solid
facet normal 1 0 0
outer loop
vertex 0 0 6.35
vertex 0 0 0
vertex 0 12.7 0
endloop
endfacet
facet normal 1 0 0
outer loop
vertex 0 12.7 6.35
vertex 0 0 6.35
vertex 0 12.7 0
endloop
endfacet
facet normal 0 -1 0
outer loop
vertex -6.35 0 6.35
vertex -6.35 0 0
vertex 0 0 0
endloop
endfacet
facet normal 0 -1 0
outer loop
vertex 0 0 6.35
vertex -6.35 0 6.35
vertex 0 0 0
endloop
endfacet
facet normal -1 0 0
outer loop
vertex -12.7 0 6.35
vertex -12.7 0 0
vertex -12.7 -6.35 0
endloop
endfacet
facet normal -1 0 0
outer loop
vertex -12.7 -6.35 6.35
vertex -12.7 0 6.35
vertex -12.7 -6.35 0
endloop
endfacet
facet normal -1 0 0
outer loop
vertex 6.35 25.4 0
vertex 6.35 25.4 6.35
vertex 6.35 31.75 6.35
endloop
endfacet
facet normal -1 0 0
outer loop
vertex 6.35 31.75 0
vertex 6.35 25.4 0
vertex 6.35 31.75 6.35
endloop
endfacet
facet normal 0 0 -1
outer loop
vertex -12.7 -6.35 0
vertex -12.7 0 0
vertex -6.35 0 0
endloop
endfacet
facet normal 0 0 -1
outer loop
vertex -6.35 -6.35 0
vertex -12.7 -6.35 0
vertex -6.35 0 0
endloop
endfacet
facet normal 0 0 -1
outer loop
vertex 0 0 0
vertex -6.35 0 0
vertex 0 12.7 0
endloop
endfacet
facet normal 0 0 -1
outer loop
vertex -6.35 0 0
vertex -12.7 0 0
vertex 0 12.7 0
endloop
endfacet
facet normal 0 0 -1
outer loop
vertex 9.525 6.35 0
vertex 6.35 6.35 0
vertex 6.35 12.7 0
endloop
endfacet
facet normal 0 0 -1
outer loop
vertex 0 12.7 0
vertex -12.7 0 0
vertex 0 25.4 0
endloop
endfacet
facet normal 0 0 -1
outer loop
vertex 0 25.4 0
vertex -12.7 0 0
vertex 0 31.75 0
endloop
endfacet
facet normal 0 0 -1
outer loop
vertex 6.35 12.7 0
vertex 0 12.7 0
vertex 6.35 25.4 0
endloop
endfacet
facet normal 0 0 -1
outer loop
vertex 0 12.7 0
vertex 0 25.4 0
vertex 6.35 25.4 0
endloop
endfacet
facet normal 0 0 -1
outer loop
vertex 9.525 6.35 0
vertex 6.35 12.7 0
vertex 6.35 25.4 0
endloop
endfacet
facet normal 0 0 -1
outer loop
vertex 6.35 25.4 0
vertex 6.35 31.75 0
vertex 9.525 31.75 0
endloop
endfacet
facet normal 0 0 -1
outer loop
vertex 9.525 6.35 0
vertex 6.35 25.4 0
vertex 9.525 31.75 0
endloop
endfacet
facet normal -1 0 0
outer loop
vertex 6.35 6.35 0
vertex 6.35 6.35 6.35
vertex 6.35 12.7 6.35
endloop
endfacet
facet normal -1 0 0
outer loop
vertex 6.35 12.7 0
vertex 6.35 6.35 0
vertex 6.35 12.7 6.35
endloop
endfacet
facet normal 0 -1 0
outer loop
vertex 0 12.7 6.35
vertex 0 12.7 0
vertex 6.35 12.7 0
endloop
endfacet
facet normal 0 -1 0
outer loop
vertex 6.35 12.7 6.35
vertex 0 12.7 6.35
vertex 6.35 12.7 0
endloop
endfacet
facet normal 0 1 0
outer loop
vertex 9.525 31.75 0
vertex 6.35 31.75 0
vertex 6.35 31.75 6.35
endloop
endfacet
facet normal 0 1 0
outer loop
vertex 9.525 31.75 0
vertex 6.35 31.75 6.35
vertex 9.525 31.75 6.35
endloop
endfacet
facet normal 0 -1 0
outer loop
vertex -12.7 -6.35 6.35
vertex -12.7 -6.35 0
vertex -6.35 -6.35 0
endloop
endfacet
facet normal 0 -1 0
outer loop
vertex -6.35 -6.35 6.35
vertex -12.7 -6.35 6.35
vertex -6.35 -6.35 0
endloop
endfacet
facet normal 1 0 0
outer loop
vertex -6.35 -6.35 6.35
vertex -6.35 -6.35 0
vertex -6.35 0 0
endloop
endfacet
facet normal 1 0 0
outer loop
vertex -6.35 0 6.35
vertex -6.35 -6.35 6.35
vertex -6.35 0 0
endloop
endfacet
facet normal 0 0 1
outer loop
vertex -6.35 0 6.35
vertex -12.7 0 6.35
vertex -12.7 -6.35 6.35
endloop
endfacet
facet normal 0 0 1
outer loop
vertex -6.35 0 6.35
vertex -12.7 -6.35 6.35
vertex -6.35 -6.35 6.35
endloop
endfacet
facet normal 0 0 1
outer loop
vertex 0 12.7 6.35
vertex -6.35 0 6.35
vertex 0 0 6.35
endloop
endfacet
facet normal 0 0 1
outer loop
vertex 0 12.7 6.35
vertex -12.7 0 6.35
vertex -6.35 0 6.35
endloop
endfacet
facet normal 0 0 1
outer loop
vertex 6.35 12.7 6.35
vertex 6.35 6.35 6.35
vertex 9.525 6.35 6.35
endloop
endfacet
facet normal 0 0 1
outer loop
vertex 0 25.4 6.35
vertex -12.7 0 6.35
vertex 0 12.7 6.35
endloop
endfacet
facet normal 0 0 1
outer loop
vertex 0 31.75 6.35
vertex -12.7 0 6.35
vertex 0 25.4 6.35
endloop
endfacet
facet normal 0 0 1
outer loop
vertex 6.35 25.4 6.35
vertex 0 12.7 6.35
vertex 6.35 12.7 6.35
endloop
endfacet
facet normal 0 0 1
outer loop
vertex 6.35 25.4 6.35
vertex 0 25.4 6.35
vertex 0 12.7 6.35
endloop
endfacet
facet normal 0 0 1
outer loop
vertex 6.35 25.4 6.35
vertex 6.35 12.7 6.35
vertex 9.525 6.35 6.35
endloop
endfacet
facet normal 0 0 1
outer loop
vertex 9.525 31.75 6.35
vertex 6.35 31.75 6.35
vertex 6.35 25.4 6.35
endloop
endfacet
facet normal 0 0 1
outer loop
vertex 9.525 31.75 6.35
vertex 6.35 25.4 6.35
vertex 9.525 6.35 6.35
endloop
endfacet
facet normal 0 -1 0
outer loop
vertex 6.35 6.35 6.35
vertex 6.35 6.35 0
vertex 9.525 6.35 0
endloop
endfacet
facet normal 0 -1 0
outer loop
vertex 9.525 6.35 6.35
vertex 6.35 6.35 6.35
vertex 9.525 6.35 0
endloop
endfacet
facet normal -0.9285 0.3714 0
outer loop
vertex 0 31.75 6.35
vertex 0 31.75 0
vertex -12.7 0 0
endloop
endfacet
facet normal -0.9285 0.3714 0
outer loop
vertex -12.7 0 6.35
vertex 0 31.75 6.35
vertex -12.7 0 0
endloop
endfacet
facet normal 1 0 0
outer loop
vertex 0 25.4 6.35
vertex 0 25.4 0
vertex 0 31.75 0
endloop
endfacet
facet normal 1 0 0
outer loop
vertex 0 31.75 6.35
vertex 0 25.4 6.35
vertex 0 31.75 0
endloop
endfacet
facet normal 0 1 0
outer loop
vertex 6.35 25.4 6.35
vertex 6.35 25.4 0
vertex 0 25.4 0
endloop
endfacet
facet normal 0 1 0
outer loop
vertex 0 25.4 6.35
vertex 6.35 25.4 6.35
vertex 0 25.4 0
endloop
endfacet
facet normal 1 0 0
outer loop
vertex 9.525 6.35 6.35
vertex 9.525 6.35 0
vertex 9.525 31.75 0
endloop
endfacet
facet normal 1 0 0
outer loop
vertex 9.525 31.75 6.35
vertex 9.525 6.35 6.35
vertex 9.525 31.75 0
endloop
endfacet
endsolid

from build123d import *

# Parameters (mm, degrees)
BOSS_EXTRUDE1_DEPTH = 6.35
SKETCH2_W           = 3.175
SKETCH2_H           = 25.4
BOSS_EXTRUDE2_DEPTH = 6.35


with BuildPart() as part:
    # Sketch1 → Boss-Extrude1 (new body)
    with BuildSketch(Plane.XY):
        Polygon((0, 0), (0, 12.7), (6.35, 12.7), (6.35, 25.4), (0, 25.4), (0, 31.75), (-12.7, 0), (-12.7, -6.35), (-6.35, -6.35), (-6.35, 0), align=None)
    extrude(amount=BOSS_EXTRUDE1_DEPTH)

    # Sketch2 → Boss-Extrude2 (add)
    with BuildSketch(Plane.XY):
        with Locations((7.9375, 19.05)):
            Rectangle(SKETCH2_W, SKETCH2_H)
    extrude(amount=BOSS_EXTRUDE2_DEPTH)


solid = part.part
